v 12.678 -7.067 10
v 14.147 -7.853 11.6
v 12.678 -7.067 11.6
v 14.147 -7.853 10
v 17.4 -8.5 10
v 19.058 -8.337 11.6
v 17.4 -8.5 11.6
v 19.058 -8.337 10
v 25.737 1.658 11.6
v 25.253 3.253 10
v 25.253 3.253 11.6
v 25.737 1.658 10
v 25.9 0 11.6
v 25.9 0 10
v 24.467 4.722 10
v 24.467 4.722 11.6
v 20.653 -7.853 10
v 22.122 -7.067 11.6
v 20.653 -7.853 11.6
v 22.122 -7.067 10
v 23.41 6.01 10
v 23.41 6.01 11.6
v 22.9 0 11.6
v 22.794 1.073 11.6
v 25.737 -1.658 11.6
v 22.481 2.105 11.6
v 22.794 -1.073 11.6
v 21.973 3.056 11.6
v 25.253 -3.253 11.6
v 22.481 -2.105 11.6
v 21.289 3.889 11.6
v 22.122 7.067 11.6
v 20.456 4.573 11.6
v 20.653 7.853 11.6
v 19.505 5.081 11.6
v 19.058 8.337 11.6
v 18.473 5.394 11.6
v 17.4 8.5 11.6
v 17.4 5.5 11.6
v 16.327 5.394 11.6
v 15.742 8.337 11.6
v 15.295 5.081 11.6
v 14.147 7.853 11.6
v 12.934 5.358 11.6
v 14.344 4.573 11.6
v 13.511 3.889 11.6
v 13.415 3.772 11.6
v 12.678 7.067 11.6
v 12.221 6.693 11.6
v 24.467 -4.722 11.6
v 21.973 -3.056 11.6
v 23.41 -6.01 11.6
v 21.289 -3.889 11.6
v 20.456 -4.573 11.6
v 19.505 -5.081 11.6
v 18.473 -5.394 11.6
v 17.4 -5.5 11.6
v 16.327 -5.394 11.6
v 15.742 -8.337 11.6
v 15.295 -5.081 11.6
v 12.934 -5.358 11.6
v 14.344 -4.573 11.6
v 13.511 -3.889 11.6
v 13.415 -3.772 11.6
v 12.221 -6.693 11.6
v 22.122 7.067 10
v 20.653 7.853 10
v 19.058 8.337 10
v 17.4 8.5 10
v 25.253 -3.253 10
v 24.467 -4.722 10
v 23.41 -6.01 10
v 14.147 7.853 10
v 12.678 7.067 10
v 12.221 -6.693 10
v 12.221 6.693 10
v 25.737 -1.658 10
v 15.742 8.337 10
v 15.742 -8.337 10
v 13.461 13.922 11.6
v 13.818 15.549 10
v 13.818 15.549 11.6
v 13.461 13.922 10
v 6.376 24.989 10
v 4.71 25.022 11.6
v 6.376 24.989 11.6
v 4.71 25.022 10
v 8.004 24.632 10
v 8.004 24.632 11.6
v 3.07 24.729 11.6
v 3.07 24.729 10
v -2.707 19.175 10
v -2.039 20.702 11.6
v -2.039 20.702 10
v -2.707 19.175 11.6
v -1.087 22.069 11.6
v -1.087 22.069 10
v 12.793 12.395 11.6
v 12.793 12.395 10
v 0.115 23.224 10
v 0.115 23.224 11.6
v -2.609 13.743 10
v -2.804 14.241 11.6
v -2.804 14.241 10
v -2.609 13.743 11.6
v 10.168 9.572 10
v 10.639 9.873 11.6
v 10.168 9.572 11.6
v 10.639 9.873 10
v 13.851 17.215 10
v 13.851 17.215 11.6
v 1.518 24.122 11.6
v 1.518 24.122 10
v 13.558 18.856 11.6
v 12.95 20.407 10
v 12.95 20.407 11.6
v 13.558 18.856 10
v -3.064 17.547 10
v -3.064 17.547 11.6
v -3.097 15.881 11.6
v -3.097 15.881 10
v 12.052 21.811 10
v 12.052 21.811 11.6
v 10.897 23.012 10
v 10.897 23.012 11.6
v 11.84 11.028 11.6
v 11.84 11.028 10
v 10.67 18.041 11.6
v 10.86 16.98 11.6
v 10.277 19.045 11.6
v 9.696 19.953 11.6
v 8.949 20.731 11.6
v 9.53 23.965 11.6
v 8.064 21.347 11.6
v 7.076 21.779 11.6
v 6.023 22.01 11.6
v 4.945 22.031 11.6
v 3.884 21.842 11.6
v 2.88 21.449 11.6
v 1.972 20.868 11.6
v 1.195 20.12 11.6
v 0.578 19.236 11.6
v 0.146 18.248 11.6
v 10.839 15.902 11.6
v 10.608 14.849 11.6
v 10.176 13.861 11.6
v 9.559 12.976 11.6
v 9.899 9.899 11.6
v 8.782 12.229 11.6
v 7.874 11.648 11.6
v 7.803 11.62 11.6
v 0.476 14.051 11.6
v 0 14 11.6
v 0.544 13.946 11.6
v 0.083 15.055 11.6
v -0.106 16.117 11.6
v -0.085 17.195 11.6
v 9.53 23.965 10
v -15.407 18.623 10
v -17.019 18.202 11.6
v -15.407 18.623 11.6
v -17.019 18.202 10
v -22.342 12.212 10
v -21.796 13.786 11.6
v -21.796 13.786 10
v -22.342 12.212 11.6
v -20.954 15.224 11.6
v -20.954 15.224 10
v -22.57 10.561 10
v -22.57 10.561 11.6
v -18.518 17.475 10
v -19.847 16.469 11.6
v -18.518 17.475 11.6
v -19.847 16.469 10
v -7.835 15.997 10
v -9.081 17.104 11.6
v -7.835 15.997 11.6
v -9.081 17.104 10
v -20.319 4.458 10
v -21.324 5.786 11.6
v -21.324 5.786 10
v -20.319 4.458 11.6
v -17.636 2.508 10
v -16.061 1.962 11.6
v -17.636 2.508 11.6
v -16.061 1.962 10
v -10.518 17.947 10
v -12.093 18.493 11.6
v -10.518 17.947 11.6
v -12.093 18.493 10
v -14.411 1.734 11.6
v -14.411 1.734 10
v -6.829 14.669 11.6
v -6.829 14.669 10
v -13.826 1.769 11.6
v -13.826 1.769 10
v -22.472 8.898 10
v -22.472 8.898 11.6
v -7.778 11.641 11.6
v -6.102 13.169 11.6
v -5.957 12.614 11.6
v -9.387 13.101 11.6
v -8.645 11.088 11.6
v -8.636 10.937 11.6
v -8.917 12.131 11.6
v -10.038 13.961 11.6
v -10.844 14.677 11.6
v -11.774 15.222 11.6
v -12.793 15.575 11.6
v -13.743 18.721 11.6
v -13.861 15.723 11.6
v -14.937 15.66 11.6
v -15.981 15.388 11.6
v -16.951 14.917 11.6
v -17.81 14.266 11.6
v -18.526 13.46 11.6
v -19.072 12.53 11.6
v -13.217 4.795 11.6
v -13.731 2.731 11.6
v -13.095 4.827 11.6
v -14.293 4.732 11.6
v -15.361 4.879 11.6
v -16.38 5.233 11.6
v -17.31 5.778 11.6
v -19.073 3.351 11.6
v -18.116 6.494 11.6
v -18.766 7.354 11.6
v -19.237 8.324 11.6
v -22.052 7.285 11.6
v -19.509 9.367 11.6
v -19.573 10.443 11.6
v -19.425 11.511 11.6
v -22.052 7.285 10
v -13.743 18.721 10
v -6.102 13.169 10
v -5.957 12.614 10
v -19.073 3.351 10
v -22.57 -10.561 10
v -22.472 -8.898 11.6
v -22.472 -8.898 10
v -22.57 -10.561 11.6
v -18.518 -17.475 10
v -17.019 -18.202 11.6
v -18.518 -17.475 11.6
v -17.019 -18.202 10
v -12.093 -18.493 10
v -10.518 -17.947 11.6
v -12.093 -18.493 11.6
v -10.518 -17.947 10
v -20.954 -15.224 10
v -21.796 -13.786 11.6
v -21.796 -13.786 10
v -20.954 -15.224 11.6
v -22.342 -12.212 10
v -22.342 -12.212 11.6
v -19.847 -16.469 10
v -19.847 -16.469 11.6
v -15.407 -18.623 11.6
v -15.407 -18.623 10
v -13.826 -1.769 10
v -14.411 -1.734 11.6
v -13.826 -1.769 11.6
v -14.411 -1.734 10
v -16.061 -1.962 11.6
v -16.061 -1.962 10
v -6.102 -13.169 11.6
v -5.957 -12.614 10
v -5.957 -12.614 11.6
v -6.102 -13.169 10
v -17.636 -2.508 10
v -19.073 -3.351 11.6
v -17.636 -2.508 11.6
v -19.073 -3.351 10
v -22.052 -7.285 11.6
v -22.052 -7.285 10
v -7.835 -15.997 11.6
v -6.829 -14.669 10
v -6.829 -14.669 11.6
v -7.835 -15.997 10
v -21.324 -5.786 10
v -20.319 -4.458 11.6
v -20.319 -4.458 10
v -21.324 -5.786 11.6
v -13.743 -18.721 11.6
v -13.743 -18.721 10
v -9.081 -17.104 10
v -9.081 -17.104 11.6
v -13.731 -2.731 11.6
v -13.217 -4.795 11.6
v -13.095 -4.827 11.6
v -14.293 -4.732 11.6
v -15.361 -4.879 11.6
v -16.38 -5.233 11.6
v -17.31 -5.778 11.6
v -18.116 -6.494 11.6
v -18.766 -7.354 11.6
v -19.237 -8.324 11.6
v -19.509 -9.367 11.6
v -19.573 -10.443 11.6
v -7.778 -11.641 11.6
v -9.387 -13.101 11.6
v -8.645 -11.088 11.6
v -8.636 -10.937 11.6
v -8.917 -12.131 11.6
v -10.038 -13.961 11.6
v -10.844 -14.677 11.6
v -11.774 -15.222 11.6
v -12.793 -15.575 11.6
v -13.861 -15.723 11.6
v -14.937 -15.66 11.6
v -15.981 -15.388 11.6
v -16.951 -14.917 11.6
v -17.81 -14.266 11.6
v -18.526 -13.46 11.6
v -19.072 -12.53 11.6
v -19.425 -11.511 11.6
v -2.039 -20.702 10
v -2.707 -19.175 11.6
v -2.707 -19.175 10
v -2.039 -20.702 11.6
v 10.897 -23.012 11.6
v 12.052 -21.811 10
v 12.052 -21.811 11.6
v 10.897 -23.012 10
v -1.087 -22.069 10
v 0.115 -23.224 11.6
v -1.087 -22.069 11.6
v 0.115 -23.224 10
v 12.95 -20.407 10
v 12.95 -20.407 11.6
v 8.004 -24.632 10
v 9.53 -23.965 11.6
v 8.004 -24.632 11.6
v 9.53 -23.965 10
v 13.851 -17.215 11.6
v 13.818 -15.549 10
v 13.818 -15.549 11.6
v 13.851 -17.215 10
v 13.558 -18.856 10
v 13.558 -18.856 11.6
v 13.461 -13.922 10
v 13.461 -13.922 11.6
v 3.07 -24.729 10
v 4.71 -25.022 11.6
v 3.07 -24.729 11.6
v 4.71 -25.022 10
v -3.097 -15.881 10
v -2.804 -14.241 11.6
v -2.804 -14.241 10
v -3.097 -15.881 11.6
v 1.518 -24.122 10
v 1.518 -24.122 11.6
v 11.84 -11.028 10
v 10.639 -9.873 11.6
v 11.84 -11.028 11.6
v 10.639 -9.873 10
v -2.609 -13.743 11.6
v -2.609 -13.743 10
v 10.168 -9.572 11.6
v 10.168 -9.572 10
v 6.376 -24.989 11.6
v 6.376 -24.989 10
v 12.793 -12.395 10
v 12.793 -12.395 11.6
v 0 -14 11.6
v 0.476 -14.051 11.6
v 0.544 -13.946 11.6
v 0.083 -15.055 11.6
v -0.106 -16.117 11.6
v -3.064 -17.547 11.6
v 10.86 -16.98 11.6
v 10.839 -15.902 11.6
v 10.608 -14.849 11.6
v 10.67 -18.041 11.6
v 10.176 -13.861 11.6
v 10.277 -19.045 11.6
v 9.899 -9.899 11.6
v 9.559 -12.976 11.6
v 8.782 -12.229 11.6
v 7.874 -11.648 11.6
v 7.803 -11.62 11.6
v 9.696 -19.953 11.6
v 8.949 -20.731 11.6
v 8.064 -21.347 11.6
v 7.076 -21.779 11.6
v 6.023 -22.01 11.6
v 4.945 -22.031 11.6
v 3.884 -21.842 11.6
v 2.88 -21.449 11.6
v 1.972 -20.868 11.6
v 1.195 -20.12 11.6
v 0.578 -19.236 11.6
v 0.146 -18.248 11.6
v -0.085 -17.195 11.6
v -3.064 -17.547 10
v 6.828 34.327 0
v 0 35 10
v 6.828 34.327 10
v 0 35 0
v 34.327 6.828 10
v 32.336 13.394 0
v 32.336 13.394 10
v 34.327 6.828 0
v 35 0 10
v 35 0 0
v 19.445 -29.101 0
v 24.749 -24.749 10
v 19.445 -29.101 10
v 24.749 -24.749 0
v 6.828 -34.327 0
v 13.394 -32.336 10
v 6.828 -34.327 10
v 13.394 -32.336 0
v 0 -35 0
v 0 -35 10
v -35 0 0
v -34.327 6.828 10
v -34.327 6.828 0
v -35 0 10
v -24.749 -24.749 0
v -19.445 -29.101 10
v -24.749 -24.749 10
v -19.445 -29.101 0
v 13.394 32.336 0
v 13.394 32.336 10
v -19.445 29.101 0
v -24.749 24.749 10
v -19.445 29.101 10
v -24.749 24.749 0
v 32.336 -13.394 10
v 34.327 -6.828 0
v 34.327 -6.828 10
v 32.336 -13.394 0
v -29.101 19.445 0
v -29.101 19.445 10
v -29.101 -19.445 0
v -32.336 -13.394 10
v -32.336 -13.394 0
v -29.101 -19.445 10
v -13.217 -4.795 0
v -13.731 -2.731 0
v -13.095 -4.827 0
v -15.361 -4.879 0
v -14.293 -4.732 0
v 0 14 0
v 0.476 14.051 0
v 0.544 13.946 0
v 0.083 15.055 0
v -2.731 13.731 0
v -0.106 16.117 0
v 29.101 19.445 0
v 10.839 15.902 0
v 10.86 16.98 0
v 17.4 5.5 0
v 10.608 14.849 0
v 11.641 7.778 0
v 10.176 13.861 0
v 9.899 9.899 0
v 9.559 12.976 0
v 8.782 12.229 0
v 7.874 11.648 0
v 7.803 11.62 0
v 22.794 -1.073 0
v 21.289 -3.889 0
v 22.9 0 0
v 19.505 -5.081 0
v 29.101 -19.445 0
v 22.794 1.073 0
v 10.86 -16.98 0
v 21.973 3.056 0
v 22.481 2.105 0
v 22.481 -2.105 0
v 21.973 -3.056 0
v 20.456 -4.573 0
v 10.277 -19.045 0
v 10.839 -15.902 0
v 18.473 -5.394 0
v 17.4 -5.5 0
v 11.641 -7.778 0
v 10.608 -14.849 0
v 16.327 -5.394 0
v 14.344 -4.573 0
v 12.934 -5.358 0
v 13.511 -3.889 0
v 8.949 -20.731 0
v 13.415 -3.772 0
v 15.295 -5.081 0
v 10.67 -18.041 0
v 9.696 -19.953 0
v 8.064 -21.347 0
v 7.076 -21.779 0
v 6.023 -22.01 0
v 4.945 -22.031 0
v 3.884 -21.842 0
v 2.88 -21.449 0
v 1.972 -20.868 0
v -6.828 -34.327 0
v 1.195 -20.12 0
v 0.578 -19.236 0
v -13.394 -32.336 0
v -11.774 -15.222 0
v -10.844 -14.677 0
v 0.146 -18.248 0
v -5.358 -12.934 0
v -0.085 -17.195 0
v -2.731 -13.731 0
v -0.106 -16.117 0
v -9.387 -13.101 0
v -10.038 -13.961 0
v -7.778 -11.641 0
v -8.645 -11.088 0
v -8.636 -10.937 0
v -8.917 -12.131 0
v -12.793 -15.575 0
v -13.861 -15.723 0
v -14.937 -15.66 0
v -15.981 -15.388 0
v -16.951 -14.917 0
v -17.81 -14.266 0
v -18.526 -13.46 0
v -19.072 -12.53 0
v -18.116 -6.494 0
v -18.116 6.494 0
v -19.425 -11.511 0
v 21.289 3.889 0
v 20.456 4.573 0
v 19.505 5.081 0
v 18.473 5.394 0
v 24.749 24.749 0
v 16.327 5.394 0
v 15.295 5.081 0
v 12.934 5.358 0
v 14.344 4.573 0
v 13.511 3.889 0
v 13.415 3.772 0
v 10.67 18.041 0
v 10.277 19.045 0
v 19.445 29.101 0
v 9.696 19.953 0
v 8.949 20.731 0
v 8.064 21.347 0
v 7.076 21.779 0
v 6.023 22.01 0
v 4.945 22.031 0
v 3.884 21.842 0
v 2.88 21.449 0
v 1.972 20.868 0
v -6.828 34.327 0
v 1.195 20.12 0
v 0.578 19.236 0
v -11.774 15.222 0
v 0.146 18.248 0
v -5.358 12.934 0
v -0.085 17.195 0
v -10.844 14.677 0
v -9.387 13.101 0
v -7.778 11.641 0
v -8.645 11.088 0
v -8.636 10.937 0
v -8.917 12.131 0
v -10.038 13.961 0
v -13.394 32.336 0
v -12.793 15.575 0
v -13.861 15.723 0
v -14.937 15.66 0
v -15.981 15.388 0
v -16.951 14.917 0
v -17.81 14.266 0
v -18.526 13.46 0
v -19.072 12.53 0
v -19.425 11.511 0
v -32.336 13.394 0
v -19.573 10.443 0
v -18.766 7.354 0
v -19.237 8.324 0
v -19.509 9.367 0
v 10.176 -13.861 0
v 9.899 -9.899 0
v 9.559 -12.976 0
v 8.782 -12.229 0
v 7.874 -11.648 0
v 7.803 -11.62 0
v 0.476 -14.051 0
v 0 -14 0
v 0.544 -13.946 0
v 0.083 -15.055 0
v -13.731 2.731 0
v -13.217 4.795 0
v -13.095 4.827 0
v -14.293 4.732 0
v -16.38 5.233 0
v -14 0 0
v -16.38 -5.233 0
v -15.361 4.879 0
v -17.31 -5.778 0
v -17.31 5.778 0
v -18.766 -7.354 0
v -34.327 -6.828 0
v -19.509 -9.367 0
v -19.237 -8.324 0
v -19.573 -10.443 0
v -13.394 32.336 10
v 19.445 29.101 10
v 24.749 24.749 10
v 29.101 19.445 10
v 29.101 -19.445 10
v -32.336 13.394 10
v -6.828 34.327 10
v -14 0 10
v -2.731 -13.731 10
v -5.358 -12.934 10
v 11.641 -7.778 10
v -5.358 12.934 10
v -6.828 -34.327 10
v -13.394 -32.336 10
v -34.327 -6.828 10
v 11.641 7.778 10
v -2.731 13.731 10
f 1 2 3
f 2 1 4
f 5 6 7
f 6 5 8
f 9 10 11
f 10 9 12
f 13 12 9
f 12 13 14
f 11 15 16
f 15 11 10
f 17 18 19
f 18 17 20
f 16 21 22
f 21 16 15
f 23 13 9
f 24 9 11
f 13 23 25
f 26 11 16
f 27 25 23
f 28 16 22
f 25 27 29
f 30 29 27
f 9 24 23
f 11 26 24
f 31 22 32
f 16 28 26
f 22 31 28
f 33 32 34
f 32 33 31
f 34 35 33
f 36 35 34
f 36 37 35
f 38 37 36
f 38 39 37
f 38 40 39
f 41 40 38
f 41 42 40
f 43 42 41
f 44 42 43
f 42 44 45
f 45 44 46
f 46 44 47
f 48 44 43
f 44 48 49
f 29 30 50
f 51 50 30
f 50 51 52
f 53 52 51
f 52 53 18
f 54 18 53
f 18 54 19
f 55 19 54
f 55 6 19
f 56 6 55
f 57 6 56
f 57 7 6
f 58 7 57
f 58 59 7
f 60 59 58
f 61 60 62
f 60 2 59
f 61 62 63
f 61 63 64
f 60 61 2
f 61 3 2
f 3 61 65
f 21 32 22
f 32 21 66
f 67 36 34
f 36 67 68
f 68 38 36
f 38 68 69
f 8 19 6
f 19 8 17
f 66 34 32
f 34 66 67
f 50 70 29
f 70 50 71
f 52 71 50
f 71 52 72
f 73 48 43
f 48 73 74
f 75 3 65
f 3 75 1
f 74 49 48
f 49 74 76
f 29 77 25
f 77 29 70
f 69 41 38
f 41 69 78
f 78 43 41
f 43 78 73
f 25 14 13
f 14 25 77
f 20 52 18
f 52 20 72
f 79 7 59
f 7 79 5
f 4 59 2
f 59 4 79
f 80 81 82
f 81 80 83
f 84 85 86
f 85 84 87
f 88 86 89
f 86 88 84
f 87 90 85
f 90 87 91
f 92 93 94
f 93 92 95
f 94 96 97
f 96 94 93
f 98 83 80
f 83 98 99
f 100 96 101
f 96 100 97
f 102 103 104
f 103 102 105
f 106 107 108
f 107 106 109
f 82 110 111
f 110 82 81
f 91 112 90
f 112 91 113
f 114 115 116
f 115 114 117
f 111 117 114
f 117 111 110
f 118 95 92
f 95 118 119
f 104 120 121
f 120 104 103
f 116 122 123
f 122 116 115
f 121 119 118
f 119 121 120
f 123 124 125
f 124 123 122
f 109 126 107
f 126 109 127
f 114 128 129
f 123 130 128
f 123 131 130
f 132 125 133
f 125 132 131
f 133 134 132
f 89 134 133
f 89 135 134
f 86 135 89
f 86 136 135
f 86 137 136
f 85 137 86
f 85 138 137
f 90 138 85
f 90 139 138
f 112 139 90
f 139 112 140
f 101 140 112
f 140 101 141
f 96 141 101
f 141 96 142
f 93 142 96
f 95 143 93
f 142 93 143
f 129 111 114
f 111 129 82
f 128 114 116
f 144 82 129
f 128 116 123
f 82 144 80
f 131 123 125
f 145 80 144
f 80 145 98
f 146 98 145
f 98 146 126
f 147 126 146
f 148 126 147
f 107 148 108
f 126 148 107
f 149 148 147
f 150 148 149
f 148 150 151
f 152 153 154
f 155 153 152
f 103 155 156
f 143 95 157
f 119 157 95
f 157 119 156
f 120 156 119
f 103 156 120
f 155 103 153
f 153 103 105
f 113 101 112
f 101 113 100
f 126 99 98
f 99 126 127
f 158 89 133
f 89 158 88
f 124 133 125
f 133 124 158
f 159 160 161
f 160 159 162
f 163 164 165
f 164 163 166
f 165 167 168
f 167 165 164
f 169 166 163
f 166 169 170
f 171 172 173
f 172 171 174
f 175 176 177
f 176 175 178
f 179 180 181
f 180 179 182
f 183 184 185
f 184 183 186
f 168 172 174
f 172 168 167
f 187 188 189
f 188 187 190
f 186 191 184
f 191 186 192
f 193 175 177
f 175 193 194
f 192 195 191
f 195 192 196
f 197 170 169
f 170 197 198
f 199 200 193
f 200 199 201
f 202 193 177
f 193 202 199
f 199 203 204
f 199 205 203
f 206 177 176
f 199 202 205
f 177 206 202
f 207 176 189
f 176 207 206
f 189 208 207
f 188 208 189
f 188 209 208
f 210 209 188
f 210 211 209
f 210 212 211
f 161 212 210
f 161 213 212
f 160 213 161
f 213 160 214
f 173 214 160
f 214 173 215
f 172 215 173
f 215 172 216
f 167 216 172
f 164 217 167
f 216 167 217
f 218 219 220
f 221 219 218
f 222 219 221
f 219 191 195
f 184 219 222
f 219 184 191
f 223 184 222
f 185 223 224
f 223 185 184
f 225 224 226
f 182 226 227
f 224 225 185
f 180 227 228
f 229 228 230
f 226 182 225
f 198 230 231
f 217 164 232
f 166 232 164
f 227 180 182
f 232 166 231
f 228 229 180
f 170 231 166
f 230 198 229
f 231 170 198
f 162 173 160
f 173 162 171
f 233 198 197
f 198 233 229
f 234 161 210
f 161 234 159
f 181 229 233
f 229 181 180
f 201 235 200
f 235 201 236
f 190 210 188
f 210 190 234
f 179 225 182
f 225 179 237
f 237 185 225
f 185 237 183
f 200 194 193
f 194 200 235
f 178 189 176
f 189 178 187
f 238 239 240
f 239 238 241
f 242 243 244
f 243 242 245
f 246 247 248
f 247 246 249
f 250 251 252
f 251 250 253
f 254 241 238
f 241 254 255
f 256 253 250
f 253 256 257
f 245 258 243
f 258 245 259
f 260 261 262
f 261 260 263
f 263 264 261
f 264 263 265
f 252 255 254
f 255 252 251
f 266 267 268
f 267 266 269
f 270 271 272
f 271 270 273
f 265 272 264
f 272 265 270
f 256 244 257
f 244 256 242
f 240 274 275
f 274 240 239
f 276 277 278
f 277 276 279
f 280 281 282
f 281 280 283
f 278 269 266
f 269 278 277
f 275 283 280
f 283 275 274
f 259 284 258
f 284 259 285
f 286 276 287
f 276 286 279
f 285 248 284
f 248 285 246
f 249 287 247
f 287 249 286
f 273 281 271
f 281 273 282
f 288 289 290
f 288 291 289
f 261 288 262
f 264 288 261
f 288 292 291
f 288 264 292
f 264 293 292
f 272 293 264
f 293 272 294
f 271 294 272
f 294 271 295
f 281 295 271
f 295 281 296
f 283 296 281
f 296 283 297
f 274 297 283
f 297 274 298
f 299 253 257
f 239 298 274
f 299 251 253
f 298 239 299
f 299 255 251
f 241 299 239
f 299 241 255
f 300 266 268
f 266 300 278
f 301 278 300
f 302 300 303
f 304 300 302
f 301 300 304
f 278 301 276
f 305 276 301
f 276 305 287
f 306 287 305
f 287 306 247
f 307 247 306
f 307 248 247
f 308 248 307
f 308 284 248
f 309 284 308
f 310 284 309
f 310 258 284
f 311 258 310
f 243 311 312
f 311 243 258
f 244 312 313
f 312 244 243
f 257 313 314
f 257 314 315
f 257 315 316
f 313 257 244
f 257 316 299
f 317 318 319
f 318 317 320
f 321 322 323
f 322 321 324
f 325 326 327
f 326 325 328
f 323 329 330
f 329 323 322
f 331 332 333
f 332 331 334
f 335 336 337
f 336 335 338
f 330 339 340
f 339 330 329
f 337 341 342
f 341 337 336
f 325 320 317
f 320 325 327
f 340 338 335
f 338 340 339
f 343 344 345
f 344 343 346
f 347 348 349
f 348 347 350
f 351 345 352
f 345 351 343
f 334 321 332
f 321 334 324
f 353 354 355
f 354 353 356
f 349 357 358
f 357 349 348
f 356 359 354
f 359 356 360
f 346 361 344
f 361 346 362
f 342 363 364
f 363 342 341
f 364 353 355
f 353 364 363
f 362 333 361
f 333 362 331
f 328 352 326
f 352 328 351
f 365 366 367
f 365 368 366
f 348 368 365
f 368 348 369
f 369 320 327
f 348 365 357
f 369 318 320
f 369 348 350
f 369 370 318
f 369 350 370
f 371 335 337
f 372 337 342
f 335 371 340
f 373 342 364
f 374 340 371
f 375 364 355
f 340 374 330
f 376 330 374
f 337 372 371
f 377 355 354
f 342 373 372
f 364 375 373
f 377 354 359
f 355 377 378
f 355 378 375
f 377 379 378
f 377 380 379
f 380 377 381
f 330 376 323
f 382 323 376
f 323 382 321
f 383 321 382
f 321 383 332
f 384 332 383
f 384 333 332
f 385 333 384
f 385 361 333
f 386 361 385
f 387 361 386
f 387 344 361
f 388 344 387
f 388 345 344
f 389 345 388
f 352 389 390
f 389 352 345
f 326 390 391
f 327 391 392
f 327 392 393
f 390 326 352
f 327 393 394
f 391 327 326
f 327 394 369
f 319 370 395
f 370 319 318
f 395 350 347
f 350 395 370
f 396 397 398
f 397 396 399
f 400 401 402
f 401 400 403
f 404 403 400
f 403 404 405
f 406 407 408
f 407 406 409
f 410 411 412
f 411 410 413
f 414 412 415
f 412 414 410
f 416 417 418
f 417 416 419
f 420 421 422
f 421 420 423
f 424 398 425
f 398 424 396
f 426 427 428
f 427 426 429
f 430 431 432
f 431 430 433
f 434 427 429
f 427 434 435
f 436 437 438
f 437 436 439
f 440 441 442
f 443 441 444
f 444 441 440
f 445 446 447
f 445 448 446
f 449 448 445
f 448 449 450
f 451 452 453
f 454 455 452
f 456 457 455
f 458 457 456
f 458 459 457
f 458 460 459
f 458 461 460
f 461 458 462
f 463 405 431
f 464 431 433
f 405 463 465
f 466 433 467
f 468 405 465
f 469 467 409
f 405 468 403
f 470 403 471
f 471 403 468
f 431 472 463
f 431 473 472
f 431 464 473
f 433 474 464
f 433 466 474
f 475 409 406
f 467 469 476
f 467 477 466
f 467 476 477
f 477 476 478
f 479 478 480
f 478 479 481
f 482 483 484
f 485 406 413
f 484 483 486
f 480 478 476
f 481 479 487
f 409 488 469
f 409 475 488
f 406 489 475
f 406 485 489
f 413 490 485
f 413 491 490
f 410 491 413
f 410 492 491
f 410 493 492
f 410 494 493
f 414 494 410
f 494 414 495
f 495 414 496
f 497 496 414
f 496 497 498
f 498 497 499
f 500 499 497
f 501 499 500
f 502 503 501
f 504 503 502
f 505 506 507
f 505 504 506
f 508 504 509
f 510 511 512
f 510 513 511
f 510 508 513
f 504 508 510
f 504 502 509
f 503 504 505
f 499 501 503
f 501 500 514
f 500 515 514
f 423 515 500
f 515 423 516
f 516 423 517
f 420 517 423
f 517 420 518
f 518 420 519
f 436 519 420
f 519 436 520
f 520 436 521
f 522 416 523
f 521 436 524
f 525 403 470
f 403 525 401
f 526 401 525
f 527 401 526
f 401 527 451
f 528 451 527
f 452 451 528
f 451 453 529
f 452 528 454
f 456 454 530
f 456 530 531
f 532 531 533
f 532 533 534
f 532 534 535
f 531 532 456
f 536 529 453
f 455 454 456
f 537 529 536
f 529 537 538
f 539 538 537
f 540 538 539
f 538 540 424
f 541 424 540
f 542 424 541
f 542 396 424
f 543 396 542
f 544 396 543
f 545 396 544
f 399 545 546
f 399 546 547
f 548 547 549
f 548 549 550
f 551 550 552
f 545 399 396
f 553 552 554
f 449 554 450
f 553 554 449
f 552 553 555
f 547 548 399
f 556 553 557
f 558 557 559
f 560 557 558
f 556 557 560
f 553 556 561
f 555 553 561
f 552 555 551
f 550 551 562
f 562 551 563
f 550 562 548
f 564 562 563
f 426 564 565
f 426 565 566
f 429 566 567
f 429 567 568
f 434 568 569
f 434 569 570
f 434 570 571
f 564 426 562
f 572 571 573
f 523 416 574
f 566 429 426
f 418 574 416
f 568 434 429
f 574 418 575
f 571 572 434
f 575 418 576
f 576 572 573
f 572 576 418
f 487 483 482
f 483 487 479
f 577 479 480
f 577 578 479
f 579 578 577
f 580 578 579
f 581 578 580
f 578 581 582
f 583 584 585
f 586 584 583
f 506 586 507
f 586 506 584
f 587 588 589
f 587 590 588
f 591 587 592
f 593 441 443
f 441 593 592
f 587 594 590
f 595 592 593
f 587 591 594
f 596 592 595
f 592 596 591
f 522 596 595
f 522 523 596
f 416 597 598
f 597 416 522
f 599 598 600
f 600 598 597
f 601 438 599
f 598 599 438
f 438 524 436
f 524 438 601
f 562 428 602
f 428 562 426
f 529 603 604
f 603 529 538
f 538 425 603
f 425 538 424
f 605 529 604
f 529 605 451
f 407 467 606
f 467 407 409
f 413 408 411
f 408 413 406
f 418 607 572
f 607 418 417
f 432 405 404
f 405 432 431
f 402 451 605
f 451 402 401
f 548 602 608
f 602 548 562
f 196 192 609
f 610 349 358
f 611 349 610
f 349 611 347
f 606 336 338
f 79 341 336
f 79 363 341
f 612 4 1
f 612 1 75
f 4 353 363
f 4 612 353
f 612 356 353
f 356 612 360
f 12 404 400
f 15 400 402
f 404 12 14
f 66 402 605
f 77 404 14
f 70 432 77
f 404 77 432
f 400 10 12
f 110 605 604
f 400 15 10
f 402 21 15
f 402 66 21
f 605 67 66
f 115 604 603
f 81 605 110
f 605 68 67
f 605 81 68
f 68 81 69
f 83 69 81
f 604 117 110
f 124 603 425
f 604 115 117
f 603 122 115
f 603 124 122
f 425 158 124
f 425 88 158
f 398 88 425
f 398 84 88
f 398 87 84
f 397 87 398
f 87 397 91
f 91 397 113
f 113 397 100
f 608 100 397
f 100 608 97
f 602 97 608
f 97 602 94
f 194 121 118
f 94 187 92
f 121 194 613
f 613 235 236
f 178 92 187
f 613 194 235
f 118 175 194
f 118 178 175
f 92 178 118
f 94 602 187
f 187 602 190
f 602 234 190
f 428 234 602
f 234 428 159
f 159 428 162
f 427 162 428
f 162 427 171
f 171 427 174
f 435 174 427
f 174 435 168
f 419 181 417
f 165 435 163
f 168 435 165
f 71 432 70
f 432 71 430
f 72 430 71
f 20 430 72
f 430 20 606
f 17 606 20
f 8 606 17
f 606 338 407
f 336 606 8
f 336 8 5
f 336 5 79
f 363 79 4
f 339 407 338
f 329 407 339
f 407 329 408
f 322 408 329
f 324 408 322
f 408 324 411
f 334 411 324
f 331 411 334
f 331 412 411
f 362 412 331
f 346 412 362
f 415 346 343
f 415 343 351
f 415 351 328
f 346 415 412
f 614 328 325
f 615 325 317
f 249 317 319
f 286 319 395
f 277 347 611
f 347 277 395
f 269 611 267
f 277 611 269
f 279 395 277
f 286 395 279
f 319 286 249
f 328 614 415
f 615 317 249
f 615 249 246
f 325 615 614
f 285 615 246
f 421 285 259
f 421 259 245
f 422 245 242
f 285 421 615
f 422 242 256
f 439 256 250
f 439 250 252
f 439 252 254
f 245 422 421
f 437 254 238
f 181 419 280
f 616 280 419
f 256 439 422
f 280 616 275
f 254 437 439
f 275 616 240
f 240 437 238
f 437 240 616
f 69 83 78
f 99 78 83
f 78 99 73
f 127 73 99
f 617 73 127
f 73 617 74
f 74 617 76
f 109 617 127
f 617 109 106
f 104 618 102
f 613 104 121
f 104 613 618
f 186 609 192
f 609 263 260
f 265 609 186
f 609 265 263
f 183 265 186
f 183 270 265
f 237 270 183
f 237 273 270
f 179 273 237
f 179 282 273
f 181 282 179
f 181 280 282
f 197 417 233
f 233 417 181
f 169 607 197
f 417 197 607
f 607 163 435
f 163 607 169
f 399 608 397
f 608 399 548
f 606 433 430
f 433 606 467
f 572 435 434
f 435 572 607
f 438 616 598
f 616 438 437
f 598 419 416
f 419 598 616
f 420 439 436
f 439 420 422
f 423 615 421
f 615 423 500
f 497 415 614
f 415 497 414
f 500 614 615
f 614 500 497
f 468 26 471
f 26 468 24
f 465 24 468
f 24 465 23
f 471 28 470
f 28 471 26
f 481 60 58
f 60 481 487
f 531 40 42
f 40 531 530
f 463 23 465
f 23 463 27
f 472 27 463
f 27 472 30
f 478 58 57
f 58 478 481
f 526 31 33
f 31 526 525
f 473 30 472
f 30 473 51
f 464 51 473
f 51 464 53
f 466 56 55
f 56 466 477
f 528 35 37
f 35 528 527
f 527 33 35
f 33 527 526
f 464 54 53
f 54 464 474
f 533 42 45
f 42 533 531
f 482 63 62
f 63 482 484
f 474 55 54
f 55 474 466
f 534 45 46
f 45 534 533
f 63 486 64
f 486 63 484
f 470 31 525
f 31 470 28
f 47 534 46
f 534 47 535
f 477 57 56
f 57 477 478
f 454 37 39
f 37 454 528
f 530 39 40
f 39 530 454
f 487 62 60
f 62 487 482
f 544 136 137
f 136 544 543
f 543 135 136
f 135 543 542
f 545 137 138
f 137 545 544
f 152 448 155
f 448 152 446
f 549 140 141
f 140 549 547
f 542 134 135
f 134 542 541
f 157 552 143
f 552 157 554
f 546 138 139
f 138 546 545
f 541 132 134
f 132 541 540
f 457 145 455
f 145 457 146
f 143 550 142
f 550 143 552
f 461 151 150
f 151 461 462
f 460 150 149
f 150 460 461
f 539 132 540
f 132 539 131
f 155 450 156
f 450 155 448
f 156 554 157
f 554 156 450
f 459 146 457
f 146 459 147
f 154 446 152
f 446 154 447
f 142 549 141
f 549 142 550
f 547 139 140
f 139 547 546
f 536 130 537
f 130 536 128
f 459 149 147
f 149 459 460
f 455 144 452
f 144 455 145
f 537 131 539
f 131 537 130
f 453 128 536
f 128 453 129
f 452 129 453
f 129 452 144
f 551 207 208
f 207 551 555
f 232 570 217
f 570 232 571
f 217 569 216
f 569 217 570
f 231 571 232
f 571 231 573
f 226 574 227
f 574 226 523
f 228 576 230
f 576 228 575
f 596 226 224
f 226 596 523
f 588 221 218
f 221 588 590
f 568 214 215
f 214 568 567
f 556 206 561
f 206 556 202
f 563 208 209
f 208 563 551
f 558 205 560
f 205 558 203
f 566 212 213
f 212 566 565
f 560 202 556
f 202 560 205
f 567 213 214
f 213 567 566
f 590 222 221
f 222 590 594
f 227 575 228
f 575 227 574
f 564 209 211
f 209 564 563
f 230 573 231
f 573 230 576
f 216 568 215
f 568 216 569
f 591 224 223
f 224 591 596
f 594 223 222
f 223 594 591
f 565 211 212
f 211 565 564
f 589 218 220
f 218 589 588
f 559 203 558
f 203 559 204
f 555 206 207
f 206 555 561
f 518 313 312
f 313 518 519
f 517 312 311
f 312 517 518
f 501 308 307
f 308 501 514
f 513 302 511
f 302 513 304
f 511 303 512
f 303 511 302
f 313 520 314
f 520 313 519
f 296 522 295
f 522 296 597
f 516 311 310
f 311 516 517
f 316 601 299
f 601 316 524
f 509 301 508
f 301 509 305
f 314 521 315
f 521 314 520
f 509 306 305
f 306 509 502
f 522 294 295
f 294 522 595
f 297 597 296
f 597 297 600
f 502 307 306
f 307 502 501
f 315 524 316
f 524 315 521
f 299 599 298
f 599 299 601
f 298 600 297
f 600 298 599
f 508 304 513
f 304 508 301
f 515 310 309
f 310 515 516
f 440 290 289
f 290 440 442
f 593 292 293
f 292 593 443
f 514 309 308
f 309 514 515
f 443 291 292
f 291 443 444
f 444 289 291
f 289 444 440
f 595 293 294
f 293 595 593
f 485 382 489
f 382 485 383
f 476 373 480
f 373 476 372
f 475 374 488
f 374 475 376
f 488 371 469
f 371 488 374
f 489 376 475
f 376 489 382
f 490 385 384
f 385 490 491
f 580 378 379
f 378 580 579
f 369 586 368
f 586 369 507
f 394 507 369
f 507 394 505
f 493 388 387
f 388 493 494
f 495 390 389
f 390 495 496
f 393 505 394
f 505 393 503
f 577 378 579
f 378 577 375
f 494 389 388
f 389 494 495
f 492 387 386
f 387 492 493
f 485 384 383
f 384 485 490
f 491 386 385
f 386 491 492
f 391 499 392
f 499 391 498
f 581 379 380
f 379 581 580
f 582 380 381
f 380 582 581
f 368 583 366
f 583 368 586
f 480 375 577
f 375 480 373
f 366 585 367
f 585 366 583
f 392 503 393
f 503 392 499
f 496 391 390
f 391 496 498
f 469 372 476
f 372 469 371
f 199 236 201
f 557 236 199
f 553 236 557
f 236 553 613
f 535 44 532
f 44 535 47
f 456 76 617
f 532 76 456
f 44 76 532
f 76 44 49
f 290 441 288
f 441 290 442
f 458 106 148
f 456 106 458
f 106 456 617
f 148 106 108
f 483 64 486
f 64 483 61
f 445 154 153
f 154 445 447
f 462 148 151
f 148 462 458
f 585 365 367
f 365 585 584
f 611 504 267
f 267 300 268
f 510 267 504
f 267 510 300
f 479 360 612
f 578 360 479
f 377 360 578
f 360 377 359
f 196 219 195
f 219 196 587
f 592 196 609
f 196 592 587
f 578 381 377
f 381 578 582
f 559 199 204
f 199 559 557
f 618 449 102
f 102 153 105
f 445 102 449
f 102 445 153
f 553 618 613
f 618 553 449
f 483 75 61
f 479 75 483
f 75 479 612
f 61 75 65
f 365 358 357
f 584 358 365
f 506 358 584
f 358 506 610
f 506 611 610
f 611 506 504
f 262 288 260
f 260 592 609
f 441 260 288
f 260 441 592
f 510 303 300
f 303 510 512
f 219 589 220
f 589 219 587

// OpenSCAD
$fn = 32;

// ----------------------------------------------------------------------
// Bolt-circle flange: 70 mm outside, 5 bolt holes, bore 28 mm
// ----------------------------------------------------------------------

// --- parameters (mm) ---
flange_d = 70;            // flange outside diameter
flange_t = 10;            // flange thickness
bolts = 5;                // number of bolt holes
bolt_d = 11;              // bolt clearance
bolt_r = 17.4;            // bolt circle radius
bore_d = 28;              // centre bore
spot_d = 17;              // spot faced bosses
spot_h = 1.6;             // spot face height

module body() {
  cylinder(h = flange_t, d = flange_d);
  /* spot faced pads under the bolt heads */
  for (i = [0 : bolts - 1]) rotate([0, 0, i * 360 / bolts]) translate([bolt_r, 0, flange_t - 1]) cylinder(h = spot_h + 1, d = spot_d);
}

difference() {
  body();
  /* bolt circle */
  for (i = [0 : bolts - 1]) rotate([0, 0, i * 360 / bolts]) translate([bolt_r, 0, -1]) cylinder(h = flange_t + 3, d = bolt_d);
  translate([0, 0, -1]) cylinder(h = flange_t + 3, d = bore_d);
}
